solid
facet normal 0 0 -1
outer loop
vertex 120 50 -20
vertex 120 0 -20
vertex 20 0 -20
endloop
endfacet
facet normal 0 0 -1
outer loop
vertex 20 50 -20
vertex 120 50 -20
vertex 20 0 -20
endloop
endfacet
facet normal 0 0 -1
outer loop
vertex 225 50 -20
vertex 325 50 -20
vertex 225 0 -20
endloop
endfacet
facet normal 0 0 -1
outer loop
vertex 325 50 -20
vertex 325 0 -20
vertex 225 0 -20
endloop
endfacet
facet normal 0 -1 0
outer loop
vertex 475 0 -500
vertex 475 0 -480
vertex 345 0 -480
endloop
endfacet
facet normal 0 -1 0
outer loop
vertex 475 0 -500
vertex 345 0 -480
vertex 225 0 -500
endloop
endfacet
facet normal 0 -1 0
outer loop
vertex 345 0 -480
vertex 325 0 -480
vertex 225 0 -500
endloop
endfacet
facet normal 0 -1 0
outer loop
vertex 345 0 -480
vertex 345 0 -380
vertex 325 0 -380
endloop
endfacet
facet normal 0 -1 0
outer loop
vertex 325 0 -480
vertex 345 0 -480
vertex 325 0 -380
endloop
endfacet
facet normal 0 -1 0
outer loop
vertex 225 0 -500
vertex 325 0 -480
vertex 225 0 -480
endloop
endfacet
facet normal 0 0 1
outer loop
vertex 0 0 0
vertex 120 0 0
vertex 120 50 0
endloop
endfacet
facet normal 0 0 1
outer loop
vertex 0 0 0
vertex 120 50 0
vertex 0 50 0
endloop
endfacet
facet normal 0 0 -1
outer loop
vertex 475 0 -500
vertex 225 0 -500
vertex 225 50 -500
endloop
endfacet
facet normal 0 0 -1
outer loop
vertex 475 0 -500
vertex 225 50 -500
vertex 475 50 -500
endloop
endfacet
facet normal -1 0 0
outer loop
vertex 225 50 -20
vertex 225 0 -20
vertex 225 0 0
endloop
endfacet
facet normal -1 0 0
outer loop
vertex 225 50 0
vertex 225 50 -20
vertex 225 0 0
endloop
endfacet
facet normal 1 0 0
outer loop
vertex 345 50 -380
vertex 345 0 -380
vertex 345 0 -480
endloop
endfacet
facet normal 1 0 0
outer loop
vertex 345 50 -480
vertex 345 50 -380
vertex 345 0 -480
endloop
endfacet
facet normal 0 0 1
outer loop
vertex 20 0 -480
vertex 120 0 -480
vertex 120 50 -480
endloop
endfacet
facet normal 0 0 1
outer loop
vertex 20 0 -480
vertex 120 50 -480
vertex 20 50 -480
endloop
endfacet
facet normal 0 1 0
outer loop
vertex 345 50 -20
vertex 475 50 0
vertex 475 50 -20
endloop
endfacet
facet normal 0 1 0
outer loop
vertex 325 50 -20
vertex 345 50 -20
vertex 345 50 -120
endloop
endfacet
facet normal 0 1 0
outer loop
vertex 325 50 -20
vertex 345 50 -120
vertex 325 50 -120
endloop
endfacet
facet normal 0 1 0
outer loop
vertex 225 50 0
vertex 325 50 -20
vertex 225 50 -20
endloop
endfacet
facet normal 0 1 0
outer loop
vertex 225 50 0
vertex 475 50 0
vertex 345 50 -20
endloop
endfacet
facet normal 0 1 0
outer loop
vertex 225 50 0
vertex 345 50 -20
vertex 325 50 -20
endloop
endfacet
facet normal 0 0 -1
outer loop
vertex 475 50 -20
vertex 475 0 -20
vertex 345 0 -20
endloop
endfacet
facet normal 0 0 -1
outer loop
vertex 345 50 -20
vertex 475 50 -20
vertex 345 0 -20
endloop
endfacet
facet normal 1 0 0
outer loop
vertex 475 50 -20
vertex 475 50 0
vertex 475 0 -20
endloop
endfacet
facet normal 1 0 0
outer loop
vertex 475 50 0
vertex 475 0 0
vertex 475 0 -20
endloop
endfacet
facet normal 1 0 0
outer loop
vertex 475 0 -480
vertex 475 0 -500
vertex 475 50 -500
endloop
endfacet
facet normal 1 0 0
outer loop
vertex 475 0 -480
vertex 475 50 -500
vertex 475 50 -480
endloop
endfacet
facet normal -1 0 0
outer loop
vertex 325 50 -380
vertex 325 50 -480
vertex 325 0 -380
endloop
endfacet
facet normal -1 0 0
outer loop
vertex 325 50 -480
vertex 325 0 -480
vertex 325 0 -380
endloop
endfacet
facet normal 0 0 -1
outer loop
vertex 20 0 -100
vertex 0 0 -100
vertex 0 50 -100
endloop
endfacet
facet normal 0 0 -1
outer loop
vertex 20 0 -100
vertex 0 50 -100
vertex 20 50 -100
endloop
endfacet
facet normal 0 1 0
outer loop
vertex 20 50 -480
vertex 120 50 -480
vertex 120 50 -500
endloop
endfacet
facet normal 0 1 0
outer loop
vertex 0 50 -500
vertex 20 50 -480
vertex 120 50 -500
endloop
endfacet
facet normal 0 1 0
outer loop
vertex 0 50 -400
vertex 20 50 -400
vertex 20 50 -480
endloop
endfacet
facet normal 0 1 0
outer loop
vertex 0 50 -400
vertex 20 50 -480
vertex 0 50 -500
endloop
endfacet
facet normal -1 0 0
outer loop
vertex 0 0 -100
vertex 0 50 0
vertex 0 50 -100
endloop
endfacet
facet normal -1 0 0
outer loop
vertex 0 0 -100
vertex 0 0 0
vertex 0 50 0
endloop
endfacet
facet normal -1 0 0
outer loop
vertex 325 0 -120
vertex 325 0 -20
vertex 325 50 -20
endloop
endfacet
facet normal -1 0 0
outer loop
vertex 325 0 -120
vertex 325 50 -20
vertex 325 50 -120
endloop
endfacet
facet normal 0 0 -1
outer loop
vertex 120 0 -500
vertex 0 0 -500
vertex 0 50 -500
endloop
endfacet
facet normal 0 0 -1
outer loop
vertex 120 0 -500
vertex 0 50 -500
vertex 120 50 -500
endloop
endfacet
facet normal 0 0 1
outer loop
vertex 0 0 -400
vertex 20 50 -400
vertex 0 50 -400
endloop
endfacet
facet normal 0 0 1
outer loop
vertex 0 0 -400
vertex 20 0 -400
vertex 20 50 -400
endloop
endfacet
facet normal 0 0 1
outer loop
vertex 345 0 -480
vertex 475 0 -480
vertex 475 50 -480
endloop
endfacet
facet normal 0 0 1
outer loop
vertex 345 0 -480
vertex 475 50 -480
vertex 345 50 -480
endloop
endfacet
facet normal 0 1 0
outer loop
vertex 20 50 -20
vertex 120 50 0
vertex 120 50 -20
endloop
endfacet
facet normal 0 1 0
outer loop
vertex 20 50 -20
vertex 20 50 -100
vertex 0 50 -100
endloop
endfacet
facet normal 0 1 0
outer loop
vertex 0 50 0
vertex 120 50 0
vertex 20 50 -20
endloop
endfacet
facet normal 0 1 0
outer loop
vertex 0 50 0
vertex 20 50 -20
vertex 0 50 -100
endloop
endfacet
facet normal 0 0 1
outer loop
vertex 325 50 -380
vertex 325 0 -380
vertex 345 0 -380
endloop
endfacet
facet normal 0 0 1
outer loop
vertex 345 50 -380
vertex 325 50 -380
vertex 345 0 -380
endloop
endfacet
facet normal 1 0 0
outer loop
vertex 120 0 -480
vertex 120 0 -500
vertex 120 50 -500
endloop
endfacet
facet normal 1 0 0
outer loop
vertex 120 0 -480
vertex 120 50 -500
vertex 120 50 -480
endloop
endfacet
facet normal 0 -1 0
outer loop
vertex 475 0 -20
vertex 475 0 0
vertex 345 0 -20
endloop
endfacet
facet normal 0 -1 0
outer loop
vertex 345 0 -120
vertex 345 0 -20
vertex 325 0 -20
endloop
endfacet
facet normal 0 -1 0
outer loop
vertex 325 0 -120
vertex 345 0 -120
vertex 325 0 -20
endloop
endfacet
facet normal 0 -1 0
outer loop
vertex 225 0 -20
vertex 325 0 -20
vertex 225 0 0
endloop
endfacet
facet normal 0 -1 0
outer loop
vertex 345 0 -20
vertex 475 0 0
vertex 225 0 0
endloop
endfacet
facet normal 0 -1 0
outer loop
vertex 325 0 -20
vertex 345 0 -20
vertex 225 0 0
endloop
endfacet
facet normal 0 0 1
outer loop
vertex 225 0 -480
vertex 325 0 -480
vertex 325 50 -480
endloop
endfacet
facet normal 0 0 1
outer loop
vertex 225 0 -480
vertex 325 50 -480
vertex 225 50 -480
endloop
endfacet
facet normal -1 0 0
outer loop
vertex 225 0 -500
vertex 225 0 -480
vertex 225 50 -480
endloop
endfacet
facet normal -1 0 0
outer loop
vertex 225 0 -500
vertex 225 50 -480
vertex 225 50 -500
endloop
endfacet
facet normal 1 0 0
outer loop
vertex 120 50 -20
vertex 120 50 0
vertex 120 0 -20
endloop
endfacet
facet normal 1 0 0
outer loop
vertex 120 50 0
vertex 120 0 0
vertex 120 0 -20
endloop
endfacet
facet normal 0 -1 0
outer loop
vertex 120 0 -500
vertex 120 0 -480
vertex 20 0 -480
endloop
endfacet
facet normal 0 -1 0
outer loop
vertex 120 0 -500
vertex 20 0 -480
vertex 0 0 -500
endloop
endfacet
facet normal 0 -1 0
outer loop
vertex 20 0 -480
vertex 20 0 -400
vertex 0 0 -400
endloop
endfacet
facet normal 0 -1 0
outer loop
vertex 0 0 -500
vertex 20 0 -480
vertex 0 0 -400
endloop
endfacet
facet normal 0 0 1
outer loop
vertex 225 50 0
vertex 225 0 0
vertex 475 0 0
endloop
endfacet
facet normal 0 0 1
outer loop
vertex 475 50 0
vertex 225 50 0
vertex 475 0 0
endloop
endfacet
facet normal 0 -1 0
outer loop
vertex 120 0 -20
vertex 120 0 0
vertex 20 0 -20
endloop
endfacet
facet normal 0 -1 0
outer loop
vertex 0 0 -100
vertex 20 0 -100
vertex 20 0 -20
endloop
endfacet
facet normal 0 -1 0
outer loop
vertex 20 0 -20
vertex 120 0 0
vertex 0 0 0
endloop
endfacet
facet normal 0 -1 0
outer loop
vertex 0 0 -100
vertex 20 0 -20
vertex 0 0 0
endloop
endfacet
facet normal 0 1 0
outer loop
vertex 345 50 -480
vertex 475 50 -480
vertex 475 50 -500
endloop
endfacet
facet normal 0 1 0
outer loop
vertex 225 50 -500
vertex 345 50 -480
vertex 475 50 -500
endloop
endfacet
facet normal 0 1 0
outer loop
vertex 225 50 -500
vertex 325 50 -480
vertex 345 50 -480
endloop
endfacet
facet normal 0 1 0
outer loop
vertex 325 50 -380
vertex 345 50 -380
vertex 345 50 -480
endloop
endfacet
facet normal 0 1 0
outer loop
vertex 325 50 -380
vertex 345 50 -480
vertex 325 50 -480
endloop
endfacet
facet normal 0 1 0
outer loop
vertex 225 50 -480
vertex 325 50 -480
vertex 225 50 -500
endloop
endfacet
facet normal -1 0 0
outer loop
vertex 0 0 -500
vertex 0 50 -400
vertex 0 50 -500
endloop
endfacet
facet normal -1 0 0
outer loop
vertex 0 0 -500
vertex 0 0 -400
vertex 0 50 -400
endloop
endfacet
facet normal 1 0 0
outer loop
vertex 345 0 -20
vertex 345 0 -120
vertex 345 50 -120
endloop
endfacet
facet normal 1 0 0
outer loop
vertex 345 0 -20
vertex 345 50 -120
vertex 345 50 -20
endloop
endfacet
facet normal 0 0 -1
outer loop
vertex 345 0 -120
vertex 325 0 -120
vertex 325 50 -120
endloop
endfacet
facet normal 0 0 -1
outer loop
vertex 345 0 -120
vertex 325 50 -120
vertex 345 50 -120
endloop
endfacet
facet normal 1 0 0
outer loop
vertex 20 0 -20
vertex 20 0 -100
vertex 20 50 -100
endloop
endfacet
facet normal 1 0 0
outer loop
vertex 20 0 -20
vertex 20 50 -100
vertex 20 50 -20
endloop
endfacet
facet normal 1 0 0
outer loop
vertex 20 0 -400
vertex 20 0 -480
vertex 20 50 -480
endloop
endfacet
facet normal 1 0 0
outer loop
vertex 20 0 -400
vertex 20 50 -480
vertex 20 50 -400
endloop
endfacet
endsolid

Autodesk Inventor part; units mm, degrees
ref_plane "YZ Plane" through (0, 0, 0) normal (1, 0, 0) x (0, 1, 0)
ref_plane "XZ Plane" through (0, 0, 0) normal (0, 1, 0) x (-1, 0, 0)
ref_plane "XY Plane" through (0, 0, 0) normal (0, 0, 1) x (1, 0, 0)
sketch "Boceto1" plane through (0, 0, 0) normal (0, 1, 0) x (-1, 0, 0)
  line L0 (0, -500) -> (-20, -500)
  line L1 (-20, -500) -> (-20, -400)
  line L2 (-20, -400) -> (0, -400)
  line L3 (0, 0) -> (0, -100)
  line L4 (0, -100) -> (-20, -100)
  line L5 (-20, -100) -> (-20, 0)
  line L6 (-20, 0) -> (0, 0)
  line L7 (-20, 0) -> (-120, 0)
  line L8 (-120, 0) -> (-120, -20)
  line L9 (-120, -20) -> (-20, -20)
  line L10 (-20, -500) -> (-120, -500)
  line L11 (-120, -500) -> (-120, -480)
  line L12 (-120, -480) -> (-20, -480)
  line L13 (-325, 0) -> (-345, 0)
  line L14 (-325, -500) -> (-345, -500)
  line L15 (-325, -480) -> (-225, -480)
  line L16 (-225, -480) -> (-225, -500)
  line L17 (-225, -500) -> (-475, -500)
  line L18 (-475, -500) -> (-475, -480)
  line L19 (-475, -480) -> (-225, -480)
  line L20 (-325, -20) -> (-225, -20)
  line L21 (-225, -20) -> (-225, 0)
  line L22 (-225, 0) -> (-475, 0)
  line L23 (-475, 0) -> (-475, -20)
  line L24 (-475, -20) -> (-225, -20)
  line L25 (-325, -20) -> (-325, -120)
  line L26 (-325, -120) -> (-345, -120)
  line L27 (-345, -120) -> (-345, -20)
  line L28 (0, 0) -> (0, -100)
  line L29 (0, -400) -> (0, -500)
  line L30 (-325, -480) -> (-325, -380)
  line L31 (-325, -380) -> (-345, -380)
  line L32 (-345, -380) -> (-345, -480)
  line L33 (-325, -480) -> (-345, -480)
  dimension "d64" = 100
  dimension "d65" = 20
extrude "Extrusión6" add sketch "Boceto1" along normal blind 50
sketch "Boceto8" plane through (0, 50, 0) normal (0, 1, 0) x (1, 0, 0)
  line L0 (120, 20) -> (20, 20) projected
  line L1 (20, 0) -> (20, 20)
  line L2 (20, 480) -> (120, 480) projected
  line L3 (20, 480) -> (20, 500)
  line L4 (225, 480) -> (325, 480) projected
  line L5 (325, 480) -> (346, 480)
  line L6 (325, 20) -> (346, 20)
  point P0 (0, 0)
properties part number "Estructura base" material "Madera (abedul)"
